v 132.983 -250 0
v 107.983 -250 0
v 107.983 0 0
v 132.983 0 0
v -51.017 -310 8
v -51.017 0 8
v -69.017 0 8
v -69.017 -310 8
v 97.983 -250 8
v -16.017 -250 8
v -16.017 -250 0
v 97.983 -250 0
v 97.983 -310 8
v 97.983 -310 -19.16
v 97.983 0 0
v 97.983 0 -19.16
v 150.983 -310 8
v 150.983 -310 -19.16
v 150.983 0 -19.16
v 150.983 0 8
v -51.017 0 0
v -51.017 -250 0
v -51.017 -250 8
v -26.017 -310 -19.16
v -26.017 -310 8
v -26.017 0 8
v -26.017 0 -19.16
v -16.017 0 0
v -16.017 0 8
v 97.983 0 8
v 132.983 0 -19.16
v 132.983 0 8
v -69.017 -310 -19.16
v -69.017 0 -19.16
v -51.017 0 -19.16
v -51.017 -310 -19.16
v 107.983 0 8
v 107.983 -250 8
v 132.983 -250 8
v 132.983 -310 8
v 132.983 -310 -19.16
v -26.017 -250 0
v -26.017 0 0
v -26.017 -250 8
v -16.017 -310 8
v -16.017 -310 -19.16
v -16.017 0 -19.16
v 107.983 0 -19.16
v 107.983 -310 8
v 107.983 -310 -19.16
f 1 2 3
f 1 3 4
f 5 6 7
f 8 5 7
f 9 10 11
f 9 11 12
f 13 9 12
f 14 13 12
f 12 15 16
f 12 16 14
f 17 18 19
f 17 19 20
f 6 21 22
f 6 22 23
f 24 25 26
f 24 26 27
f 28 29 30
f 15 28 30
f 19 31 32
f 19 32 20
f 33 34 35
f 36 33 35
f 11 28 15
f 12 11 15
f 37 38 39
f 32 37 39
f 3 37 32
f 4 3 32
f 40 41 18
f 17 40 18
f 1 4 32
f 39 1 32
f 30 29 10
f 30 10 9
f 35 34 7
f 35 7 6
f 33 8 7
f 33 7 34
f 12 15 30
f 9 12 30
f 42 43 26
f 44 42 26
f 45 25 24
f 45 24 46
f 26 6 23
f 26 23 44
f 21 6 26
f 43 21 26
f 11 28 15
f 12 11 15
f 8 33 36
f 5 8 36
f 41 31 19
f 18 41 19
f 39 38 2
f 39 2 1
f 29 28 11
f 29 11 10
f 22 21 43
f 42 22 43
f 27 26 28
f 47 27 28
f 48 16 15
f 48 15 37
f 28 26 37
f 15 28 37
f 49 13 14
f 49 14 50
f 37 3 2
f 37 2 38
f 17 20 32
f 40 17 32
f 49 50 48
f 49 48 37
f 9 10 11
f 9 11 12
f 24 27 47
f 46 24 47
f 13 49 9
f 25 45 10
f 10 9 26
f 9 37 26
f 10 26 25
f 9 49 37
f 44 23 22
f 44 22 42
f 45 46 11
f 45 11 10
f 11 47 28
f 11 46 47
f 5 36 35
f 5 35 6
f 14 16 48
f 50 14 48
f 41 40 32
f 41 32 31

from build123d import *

# Parameters (mm, degrees)
F1_DEPTH = 310
F0_W     = 114
F0_H     = 8
F2_DEPTH = 250
F3_DEPTH = 310
F0_W_2   = 25
F4_DEPTH = 250


with BuildPart() as f1:
    # F0 (on Front) → F1 (new body)
    with BuildSketch(Plane.XZ):
        Polygon((150.983323, 8), (132.983323, 8), (132.983323, 0), (132.983323, -19.15983), (150.983323, -19.15983), (150.983323, 3.84017), align=None)
        Polygon((-69.016677, -19.15983), (-51.016677, -19.15983), (-51.016677, 0), (-51.016677, 8), (-69.016677, 8), (-69.016677, 3.84017), align=None)
    extrude(amount=F1_DEPTH)


with BuildPart() as f2:
    # F0 (on Front) → F2 (new body)
    with BuildSketch(Plane.XZ):
        with Locations((40.983323, 4)):
            Rectangle(F0_W, F0_H)
    extrude(amount=F2_DEPTH)

    # F0 (on Front) → F3 (join)
    with BuildSketch(Plane.XZ):
        Polygon((-26.016677, 8), (-26.016677, 0), (-26.016677, -19.15983), (-16.016677, -19.15983), (-16.016677, 0), (-16.016677, 8), align=None)
        Polygon((107.983323, 8), (97.983323, 8), (97.983323, 0), (97.983323, -19.15983), (107.983323, -19.15983), (107.983323, 0), align=None)
    extrude(amount=F3_DEPTH)


with BuildPart() as f4:
    # F0 (on Front) → F4 (new body)
    with BuildSketch(Plane.XZ):
        with Locations((-38.516677, 4)):
            Rectangle(F0_W_2, F0_H)
        with Locations((120.483323, 4)):
            Rectangle(F0_W_2, F0_H)
        with Locations((40.983323, 4)):
            Rectangle(F0_W, F0_H)
    extrude(amount=F4_DEPTH)


solid = Compound([f1.part, f2.part, f4.part])
